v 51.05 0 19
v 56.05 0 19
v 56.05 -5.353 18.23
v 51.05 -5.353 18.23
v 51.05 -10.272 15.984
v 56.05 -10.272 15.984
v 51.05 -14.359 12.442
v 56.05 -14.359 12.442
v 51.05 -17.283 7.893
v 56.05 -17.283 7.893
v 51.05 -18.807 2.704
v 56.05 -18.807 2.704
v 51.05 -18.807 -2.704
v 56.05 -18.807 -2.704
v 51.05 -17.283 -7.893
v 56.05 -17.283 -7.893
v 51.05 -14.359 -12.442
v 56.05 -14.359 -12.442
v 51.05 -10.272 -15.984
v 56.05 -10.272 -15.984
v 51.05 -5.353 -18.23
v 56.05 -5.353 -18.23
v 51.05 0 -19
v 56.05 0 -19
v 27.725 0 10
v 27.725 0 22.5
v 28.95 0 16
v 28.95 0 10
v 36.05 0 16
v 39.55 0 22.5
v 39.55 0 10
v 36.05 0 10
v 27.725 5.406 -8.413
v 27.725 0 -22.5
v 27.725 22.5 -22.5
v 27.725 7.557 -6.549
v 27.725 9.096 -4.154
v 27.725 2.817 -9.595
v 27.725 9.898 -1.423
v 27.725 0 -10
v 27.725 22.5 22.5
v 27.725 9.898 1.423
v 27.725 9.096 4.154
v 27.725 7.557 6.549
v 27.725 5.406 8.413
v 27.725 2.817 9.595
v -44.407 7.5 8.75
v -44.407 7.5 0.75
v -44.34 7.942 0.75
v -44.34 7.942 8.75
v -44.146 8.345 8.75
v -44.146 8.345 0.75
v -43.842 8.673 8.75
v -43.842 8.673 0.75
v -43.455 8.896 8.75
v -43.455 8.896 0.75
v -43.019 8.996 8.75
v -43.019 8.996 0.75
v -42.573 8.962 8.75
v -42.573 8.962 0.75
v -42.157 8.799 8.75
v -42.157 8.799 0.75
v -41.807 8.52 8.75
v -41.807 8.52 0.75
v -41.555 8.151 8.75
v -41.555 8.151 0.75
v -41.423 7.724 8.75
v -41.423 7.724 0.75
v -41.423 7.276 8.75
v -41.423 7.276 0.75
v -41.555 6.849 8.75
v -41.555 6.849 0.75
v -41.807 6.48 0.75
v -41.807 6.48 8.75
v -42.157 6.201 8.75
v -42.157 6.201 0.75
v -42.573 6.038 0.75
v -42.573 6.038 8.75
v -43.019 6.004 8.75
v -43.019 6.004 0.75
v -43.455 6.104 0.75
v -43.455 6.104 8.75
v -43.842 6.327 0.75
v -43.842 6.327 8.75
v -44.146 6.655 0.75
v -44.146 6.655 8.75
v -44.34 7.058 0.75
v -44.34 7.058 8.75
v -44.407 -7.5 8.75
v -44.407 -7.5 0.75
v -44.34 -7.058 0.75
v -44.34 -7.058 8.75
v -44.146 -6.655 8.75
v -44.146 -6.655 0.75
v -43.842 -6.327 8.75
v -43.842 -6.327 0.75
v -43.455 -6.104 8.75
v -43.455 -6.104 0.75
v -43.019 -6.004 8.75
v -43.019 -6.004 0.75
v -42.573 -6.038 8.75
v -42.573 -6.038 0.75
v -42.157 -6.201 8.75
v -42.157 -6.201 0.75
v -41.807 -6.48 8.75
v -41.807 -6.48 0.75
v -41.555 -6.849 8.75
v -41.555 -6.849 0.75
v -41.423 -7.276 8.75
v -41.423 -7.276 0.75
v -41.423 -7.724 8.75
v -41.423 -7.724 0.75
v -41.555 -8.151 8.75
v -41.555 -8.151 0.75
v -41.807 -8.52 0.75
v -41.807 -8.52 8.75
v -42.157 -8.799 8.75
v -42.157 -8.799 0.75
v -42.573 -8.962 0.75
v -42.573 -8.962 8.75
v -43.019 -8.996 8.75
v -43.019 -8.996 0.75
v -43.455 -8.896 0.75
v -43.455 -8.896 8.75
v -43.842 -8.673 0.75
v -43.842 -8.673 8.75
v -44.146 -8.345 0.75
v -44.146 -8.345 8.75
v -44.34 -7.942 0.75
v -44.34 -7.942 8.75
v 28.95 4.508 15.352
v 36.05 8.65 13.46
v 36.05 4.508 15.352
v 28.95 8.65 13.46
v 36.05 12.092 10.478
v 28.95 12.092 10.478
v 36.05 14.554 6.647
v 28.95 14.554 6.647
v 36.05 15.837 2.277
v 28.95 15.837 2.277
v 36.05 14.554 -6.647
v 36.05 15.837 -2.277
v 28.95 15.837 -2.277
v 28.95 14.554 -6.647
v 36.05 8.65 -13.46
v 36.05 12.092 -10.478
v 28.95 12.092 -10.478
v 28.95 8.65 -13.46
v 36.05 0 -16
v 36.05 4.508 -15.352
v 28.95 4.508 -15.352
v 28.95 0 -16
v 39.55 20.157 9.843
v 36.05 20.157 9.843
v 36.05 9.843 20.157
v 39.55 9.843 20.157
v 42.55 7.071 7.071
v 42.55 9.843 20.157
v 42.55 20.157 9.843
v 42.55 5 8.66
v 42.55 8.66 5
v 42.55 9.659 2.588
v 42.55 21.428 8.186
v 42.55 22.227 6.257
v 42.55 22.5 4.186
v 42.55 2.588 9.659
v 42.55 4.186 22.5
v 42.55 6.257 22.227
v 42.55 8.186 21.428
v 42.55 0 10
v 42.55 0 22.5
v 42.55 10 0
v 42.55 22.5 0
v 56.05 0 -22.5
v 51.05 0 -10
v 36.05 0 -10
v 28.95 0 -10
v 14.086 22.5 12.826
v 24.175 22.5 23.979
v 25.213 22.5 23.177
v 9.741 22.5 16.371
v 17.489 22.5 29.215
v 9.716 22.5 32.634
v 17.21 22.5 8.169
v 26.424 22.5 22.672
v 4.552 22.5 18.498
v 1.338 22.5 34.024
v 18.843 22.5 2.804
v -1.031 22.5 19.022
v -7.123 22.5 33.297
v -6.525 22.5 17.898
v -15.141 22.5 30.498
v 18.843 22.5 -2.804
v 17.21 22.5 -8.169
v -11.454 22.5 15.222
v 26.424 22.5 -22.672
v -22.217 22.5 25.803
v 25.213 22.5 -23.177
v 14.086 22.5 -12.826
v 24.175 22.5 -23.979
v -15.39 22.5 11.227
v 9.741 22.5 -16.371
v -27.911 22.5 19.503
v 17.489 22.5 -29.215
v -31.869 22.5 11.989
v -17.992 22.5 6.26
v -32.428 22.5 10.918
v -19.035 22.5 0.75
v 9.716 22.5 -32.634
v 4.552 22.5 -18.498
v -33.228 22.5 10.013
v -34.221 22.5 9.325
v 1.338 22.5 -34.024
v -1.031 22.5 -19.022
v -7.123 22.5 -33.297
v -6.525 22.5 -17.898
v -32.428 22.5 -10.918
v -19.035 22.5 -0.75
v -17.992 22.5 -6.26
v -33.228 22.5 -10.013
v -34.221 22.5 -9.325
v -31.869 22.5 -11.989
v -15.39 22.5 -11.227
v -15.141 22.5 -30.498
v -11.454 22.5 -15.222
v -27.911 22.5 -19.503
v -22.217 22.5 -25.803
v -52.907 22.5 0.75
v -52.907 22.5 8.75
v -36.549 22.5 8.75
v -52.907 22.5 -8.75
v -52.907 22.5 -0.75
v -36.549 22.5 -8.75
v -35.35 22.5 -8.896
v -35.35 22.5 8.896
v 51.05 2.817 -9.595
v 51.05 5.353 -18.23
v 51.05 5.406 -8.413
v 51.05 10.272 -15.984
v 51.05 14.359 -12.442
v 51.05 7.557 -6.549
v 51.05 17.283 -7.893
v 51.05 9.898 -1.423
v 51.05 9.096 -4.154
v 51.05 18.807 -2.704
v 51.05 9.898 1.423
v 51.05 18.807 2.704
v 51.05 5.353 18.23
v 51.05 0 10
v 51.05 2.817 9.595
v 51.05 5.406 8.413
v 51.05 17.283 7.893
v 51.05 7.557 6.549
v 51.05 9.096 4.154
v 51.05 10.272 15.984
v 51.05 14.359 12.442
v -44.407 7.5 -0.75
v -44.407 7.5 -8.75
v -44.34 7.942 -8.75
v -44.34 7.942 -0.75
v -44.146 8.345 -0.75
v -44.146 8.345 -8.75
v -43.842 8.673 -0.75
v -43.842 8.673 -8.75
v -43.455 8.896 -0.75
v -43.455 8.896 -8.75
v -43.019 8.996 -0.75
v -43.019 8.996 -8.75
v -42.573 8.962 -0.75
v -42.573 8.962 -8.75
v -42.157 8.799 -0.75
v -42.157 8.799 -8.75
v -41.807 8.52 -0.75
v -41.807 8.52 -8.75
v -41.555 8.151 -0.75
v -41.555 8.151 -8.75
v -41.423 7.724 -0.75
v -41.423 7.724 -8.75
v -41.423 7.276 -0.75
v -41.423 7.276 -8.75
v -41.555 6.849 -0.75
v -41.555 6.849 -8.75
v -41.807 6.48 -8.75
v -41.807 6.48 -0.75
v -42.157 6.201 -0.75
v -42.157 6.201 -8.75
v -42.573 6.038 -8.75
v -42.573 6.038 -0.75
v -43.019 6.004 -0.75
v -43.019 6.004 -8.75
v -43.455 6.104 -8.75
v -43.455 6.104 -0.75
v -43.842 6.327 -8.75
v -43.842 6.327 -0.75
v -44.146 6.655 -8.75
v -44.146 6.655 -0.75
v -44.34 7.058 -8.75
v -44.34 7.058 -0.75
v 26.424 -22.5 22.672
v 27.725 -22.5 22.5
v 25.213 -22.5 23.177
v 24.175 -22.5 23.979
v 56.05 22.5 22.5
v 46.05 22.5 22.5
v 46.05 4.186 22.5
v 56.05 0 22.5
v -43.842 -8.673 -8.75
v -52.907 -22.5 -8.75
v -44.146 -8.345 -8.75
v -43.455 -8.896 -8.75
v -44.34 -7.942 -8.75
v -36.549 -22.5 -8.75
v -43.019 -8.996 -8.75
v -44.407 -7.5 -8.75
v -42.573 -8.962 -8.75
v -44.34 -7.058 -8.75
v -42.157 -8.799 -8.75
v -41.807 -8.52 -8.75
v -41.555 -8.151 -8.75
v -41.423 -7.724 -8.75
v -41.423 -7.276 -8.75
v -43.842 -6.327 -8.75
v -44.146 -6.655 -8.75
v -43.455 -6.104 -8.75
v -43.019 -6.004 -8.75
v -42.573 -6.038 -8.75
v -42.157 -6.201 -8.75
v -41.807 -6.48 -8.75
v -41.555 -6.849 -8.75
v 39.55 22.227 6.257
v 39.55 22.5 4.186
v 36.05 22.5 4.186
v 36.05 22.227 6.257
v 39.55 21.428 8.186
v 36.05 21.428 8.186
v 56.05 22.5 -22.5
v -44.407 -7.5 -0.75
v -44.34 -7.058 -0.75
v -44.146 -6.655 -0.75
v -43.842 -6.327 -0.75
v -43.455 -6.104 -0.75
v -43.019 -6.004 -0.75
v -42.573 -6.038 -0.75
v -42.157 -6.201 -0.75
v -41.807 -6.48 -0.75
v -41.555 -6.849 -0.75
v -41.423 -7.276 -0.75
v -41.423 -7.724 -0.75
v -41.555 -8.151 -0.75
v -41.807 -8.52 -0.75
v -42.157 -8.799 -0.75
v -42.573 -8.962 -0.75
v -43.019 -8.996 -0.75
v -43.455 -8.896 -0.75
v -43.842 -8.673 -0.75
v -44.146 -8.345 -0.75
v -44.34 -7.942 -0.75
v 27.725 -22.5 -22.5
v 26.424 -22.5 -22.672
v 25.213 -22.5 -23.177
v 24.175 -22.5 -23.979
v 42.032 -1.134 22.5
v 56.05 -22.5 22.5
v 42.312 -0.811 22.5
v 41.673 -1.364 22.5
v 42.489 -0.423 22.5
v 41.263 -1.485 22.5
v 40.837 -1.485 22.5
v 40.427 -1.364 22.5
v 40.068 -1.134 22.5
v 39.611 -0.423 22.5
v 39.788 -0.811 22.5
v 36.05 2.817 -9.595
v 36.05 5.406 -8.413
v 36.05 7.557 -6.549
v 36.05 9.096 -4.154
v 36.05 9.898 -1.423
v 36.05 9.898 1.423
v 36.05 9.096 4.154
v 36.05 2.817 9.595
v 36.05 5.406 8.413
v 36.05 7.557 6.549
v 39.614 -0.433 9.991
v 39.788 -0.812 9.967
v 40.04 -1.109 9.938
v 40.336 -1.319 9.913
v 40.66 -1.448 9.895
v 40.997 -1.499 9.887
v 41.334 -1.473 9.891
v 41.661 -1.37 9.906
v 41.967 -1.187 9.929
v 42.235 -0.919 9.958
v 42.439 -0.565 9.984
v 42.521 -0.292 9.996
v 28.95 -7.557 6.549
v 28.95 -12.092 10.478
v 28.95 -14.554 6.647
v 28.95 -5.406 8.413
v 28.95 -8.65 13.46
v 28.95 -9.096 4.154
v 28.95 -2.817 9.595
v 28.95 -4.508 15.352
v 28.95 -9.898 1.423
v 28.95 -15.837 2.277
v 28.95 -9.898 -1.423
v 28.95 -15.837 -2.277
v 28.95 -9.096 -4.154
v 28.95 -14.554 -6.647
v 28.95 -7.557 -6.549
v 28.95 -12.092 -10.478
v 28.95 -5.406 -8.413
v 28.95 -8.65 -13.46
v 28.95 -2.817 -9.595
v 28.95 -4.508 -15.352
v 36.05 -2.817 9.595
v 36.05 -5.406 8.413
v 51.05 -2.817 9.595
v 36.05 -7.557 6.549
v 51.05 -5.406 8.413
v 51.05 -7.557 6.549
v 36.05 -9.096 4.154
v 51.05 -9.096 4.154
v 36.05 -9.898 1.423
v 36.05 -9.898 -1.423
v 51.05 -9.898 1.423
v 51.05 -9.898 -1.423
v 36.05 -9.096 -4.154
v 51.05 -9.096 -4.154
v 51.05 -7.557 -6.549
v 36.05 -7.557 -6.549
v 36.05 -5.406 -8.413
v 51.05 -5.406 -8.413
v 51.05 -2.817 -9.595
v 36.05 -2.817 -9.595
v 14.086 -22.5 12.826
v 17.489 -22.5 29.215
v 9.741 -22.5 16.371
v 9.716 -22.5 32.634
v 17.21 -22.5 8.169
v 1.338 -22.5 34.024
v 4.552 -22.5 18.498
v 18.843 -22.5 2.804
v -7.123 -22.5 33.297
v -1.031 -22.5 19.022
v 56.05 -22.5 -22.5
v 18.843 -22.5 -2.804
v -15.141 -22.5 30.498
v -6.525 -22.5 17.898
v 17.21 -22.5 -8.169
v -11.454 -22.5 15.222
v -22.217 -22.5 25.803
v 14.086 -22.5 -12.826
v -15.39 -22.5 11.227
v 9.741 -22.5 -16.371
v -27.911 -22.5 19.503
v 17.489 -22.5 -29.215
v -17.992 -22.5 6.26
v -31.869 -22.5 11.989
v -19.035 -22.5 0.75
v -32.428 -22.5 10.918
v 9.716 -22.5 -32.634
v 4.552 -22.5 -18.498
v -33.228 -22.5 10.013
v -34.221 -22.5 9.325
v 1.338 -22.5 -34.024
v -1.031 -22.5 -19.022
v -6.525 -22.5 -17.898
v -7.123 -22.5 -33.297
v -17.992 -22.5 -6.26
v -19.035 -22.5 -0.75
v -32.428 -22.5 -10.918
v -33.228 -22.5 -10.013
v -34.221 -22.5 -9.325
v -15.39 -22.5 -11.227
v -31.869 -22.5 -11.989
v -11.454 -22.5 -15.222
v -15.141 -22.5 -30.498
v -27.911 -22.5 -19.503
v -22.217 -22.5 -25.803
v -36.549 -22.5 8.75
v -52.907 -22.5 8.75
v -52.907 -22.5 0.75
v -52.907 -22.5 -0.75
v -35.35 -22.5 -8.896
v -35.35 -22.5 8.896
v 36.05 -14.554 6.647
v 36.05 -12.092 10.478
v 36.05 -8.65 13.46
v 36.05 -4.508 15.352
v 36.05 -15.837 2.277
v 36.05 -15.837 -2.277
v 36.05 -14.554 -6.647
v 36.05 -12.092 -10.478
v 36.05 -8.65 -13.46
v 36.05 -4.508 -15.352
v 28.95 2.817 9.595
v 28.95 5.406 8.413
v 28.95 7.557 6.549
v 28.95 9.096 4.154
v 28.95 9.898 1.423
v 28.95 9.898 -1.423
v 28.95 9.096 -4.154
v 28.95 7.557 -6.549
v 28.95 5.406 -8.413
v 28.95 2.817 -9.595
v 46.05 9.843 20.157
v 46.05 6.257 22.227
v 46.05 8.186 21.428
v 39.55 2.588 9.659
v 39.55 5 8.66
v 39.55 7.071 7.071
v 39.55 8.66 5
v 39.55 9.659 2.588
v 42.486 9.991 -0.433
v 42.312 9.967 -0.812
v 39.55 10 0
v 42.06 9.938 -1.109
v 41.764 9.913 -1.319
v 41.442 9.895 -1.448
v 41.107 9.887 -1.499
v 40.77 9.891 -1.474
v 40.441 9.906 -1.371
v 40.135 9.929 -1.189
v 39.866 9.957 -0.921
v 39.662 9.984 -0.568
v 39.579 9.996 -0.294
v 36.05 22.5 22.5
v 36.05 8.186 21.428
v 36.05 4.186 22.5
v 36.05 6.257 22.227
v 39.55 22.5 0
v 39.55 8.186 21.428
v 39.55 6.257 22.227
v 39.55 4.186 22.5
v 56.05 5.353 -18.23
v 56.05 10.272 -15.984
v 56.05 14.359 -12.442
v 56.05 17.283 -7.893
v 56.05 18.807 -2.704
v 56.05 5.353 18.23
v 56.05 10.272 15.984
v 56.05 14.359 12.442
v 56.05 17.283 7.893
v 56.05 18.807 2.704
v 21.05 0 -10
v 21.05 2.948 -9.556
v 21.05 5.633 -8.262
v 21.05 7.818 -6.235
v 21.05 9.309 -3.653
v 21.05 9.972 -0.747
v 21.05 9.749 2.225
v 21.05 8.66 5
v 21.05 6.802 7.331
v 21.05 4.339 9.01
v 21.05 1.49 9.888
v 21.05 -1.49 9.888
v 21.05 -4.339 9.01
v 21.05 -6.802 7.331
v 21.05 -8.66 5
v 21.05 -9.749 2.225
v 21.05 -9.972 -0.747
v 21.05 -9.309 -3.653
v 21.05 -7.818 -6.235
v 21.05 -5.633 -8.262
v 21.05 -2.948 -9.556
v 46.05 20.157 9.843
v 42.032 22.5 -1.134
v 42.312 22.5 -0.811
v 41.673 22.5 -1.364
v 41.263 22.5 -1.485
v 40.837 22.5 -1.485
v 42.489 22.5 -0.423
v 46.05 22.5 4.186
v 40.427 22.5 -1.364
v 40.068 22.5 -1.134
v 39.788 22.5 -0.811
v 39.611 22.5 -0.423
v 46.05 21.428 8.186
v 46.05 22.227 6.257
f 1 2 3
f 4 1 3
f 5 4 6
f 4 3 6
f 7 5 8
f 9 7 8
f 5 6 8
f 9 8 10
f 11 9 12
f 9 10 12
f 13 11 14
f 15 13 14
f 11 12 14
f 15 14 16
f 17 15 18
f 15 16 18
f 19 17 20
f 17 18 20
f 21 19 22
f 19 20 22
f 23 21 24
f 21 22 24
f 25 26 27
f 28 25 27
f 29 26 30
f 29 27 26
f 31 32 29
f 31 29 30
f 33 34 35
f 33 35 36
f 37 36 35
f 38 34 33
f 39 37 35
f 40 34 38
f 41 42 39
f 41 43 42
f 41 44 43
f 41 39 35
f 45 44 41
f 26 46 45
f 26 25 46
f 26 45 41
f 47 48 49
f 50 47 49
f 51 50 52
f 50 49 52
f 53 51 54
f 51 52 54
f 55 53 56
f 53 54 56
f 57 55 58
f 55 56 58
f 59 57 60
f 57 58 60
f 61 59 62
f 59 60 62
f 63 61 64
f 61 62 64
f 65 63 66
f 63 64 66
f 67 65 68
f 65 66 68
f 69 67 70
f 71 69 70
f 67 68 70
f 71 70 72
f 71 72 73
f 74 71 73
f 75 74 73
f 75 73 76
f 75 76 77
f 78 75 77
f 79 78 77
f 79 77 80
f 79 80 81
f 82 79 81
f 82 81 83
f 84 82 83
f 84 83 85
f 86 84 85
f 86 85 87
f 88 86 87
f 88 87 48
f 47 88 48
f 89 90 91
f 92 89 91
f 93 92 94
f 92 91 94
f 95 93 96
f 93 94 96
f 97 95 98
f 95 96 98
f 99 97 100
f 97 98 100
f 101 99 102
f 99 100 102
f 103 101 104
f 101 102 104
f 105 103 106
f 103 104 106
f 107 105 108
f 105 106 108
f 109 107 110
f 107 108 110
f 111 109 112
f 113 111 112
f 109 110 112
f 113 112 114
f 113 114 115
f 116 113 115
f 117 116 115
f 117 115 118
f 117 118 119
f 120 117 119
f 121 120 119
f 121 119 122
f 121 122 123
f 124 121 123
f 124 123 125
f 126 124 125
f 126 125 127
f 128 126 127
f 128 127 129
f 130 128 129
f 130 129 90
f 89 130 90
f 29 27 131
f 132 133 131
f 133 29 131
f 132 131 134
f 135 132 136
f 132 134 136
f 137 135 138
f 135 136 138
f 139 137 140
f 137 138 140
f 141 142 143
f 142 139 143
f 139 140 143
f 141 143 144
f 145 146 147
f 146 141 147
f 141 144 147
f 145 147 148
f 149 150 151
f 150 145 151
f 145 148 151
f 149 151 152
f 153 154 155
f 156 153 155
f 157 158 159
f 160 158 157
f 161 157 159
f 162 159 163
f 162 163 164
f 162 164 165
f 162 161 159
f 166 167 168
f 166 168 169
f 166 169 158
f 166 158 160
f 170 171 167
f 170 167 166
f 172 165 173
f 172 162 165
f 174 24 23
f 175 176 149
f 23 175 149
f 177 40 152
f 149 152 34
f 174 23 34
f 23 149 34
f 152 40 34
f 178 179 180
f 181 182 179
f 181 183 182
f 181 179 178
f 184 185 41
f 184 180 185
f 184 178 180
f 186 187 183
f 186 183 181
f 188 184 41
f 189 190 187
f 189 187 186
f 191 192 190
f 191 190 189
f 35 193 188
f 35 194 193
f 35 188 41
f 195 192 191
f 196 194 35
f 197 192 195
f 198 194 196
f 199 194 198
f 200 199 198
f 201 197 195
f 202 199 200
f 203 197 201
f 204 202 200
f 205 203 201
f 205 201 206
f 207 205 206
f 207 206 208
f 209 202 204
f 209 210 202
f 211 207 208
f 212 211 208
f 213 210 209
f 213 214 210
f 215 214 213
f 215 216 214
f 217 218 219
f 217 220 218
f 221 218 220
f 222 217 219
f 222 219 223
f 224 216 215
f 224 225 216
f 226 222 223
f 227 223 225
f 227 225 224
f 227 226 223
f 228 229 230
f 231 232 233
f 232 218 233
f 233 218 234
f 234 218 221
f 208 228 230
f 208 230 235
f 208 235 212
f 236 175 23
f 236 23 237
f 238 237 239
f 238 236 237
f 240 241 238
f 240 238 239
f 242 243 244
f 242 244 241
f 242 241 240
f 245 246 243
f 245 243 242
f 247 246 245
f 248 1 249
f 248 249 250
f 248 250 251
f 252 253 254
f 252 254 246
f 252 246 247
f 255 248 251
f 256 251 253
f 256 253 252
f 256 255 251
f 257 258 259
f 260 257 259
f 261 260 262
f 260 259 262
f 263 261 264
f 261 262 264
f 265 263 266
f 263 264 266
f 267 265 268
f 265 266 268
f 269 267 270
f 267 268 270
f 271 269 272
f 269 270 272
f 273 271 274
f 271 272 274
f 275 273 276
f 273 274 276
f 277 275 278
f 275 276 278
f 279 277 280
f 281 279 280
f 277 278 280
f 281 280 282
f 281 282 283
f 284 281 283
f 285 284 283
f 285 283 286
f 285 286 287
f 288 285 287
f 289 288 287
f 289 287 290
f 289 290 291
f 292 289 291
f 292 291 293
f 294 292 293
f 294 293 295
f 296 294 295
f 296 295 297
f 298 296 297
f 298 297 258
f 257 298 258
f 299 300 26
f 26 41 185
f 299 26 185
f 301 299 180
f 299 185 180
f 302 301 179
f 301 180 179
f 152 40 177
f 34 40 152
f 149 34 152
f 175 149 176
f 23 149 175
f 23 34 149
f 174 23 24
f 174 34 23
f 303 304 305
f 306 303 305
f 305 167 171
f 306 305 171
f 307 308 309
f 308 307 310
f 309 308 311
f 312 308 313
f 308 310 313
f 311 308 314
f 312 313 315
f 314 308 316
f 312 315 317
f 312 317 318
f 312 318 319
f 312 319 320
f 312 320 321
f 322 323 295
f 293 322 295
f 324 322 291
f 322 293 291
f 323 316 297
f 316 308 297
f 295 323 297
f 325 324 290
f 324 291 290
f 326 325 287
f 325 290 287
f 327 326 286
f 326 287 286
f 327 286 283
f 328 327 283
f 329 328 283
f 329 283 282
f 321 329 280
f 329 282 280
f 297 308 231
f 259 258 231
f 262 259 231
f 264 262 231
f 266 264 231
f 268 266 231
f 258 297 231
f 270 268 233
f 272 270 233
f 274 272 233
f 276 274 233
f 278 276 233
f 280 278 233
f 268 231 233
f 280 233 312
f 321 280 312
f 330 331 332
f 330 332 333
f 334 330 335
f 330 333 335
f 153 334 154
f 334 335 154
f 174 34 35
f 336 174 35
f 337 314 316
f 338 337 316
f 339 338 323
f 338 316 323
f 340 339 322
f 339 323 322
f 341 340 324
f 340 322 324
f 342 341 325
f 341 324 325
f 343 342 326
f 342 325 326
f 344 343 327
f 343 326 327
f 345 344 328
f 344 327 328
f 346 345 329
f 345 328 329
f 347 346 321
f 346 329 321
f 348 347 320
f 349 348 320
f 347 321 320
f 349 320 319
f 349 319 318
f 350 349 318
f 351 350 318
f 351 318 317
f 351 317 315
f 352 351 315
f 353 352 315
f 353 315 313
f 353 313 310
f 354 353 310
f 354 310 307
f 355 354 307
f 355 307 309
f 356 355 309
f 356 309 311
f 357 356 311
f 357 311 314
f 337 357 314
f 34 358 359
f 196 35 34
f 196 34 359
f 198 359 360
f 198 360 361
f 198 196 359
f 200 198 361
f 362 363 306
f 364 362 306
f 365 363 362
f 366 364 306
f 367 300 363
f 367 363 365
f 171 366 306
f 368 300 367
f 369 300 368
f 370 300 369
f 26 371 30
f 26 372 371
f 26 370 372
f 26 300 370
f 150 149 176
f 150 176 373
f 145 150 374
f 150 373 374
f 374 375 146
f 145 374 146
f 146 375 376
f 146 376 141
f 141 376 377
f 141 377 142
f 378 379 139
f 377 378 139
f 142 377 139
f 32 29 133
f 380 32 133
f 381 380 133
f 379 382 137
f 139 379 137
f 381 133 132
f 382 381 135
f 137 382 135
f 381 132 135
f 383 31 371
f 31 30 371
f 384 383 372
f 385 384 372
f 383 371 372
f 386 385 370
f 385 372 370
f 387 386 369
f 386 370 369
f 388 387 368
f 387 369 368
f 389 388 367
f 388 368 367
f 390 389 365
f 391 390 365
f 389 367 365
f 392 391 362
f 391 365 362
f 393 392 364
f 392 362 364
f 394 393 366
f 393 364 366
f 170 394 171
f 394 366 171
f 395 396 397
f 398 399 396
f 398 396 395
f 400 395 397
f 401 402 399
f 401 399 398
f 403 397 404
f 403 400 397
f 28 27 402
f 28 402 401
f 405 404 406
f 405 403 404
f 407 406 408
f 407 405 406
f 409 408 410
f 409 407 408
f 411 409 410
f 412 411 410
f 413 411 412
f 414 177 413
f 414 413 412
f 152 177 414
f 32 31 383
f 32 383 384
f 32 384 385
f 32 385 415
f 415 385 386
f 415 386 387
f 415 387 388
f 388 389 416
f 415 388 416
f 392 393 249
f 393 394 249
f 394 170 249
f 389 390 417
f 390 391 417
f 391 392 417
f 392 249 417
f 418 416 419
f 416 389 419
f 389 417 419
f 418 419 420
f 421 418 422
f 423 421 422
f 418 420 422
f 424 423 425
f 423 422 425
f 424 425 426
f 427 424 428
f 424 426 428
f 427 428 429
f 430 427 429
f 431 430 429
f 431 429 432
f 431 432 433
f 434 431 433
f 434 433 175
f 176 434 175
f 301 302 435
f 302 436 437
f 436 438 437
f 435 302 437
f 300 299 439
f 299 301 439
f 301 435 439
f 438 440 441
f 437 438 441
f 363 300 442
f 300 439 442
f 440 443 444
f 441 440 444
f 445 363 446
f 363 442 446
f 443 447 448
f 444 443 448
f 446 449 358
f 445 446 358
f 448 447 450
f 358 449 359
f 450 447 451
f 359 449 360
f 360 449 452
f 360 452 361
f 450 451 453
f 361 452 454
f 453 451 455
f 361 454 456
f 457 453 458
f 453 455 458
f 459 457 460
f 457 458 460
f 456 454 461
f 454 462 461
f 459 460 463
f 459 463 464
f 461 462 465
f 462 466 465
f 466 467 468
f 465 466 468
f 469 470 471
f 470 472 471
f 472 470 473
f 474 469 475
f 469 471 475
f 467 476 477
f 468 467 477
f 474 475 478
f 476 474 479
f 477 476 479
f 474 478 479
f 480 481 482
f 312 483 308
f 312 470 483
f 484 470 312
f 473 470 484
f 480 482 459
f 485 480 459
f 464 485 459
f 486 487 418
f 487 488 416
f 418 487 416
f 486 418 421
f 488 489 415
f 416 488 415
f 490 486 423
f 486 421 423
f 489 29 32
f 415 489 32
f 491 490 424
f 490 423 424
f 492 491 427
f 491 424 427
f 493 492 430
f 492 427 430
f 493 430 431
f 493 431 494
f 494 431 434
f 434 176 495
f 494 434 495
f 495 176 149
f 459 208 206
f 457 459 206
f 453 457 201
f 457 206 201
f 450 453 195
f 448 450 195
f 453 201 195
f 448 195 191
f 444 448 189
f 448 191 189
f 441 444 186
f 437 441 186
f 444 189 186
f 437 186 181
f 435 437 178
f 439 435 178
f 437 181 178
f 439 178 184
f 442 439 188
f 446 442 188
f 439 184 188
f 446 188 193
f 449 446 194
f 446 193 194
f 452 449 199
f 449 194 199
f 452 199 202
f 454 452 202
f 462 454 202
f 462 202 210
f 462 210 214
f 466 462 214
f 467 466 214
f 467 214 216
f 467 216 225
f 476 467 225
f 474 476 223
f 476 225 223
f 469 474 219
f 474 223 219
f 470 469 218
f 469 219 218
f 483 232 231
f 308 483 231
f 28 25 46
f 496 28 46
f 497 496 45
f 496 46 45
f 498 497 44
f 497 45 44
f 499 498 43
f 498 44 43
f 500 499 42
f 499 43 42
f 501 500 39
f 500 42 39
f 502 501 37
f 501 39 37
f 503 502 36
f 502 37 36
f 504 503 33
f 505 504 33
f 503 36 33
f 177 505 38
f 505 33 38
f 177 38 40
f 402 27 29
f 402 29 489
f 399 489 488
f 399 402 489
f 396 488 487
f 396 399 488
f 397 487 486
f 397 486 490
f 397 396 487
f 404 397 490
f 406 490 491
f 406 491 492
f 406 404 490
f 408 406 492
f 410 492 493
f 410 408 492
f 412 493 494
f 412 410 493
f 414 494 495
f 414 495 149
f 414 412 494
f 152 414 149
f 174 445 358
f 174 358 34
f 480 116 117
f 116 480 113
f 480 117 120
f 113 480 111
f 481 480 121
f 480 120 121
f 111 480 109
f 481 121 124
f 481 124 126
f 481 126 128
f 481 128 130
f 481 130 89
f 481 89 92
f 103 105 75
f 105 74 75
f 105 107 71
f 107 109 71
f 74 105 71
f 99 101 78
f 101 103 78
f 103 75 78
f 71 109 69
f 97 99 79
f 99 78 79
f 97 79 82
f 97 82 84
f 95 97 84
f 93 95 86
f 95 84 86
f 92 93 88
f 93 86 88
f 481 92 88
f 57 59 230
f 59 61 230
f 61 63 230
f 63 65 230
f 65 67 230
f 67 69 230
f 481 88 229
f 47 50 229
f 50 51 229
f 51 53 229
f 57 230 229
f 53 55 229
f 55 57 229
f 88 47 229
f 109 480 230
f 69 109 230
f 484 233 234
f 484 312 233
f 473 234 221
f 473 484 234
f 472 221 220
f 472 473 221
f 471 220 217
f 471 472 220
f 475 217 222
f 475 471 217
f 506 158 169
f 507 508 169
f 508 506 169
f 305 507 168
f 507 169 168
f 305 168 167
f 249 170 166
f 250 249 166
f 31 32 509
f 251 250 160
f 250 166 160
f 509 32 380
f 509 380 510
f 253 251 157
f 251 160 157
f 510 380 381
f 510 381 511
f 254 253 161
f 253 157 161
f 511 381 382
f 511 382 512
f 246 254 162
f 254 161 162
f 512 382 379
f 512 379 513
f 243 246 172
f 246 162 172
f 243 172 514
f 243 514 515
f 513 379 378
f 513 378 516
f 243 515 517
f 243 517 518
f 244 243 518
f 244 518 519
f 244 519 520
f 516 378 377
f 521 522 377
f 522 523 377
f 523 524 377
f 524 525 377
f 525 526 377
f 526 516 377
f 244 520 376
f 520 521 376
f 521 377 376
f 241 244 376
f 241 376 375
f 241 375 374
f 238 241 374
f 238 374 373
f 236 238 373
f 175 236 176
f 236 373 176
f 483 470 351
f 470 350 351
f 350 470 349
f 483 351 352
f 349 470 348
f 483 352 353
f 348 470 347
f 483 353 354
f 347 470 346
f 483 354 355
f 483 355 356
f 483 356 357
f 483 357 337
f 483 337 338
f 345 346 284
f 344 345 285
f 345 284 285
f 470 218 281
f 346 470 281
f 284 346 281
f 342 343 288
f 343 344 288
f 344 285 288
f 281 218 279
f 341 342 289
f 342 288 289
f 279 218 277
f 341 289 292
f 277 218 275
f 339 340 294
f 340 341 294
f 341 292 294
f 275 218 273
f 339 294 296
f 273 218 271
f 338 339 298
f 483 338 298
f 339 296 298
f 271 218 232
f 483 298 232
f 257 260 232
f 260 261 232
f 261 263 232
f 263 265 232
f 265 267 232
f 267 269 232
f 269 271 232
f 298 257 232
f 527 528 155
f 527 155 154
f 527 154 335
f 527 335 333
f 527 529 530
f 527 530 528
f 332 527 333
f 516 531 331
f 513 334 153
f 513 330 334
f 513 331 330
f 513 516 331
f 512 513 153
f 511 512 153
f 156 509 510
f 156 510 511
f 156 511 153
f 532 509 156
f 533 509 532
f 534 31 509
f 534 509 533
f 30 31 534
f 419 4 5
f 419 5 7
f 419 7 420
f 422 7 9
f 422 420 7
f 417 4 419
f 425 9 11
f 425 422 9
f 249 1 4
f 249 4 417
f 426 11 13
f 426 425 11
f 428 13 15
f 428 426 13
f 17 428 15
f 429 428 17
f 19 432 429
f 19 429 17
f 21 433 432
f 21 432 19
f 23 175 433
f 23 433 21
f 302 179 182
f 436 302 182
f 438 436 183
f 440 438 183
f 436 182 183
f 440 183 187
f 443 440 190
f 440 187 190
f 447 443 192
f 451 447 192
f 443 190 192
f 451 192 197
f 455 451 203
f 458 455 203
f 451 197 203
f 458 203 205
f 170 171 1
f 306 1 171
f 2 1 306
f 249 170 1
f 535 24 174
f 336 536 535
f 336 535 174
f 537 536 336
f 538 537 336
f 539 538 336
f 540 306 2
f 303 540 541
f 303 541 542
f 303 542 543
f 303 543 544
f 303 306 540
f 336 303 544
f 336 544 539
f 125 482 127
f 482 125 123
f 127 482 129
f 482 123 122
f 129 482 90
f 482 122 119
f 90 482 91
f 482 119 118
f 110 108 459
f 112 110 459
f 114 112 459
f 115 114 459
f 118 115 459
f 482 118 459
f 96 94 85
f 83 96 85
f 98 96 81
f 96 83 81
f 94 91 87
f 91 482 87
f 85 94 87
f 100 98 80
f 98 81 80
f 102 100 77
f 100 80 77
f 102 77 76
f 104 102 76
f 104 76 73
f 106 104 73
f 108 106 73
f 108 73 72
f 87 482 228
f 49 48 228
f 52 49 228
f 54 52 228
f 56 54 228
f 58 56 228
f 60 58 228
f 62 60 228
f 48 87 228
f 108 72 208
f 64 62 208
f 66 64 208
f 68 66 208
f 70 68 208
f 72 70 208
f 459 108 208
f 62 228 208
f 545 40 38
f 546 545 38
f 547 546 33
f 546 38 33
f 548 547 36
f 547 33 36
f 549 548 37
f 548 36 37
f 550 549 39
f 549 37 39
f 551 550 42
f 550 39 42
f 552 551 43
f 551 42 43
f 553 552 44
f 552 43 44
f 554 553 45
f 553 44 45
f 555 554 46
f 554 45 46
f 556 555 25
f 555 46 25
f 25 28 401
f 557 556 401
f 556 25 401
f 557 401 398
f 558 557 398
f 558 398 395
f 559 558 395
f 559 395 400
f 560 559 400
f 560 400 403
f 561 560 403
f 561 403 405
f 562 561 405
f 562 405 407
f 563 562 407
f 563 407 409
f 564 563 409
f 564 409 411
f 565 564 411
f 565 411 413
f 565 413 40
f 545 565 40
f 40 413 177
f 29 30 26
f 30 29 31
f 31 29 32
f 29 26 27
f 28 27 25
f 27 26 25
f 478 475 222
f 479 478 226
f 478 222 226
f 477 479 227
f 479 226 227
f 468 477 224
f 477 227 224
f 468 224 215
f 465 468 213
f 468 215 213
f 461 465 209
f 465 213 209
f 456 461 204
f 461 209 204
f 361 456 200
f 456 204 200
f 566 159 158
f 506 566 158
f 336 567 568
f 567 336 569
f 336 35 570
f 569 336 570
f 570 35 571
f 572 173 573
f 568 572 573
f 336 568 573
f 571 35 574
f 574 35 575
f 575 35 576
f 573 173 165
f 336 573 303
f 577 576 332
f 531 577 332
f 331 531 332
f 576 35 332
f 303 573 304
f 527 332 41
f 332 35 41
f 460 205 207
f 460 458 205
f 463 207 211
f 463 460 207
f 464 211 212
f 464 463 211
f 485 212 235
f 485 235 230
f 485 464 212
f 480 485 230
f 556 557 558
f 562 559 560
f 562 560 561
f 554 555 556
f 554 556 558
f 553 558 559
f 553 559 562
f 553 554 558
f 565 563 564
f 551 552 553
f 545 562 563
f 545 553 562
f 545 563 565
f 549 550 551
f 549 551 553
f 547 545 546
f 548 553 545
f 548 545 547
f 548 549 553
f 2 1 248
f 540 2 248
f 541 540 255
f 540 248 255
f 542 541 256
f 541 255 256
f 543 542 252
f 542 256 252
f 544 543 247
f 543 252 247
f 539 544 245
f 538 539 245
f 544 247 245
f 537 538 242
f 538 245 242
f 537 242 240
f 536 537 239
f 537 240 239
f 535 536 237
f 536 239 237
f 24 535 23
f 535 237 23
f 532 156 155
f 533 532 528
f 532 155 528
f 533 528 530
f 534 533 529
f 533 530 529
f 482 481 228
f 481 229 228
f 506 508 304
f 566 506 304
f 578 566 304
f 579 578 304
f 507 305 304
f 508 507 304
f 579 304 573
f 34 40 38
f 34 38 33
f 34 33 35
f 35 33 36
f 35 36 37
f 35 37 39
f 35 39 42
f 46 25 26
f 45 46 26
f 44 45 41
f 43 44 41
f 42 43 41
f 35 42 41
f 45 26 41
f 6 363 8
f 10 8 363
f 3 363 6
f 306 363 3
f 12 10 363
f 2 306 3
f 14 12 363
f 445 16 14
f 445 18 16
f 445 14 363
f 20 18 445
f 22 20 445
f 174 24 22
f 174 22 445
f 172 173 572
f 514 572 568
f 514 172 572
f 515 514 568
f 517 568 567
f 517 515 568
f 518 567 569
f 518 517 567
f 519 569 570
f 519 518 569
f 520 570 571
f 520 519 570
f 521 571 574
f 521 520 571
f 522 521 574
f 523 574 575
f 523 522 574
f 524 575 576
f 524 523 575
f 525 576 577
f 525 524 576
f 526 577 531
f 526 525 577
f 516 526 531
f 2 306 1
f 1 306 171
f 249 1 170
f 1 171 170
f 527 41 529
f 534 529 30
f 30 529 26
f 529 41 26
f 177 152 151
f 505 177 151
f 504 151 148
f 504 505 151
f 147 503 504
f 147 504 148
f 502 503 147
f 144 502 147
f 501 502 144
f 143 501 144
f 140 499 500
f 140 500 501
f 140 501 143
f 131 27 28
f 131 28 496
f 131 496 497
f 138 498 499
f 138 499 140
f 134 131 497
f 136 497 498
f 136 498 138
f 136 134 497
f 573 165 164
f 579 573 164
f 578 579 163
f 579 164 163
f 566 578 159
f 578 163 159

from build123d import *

# Parameters (mm, degrees)
BOSS_EXTRUDE1_DEPTH     = 22.5
F_3_0MM_DOWEL_HOLE1_D   = 3
BOSS_EXTRUDE2_START     = -8.493151603
BOSS_EXTRUDE2_OUTLINE_W = 45
BOSS_EXTRUDE2_OUTLINE_H = 45
BOSS_EXTRUDE2_DEPTH     = 30.493151603
SKETCH5_R               = 10
CUT_EXTRUDE1_DEPTH      = 35
SKETCH16_R              = 19
CUT_EXTRUDE9_DEPTH      = 5
CUT_EXTRUDE2_START      = 22.5
SKETCH7_W               = 7.1
SKETCH7_H               = 45
CUT_EXTRUDE2_DEPTH      = 40
SKETCH8_W               = 22.5
SKETCH8_H               = 22.5
CUT_EXTRUDE3_DEPTH      = 1.5
CUT_EXTRUDE5_OUTLINE_W  = 1.5
CUT_EXTRUDE5_OUTLINE_H  = 12.613186919
CUT_EXTRUDE8_START      = 9
CUT_EXTRUDE8_DEPTH      = 14
CHAMFER1_START          = 36.05
CHAMFER1_DEPTH          = 10
FILLET3_R               = 5
FILLET4_R               = 8
SKETCH23_W              = 45
SKETCH23_H              = 40
SKETCH23_R              = 16
BOSS_EXTRUDE5_DEPTH     = 7.1
SPLIT1_START            = 27.724582954
SPLIT1_DEPTH            = 23.325417046
SPLIT1_START_2          = 36.05
SPLIT1_2_DEPTH          = 15
SPLIT1_START_3          = 46.05
SPLIT1_3_DEPTH          = 10
SPLIT1_4_DEPTH          = 8.325417046
SPLIT1_5_DEPTH          = 1.225417046
SPLIT1_6_DEPTH          = 22.5
SPLIT1_7_DEPTH          = 22.5


with BuildPart() as part:
    # Sketch3 → Boss-Extrude1 (new, symmetric)
    with BuildSketch(Plane(origin=(0, 0, 0), x_dir=(1, 0, 0), z_dir=(0, 1, 0))):
        with BuildLine():
            Line((-52.906534306, 0.75), (-52.906534306, 8.75))
            Line((-52.906534306, 8.75), (-32.906534306, 8.75))
            ThreePointArc((-32.906534306, 8.75), (34.05, 0), (-32.906534306, -8.75))
            Line((-32.906534306, -8.75), (-52.906534306, -8.75))
            Line((-52.906534306, -8.75), (-52.906534306, -0.75))
            Line((-52.906534306, -0.75), (-19.035230495, -0.75))
            ThreePointArc((-19.035230495, -0.75), (19.05, 0), (-19.035230495, 0.75))
            Line((-19.035230495, 0.75), (-52.906534306, 0.75))
        make_face()
    extrude(amount=BOSS_EXTRUDE1_DEPTH, both=True)

    # Ø3.0mm Dowel Hole1 (through all)
    with Locations(Plane.XY.offset(8.75)):
        with Locations((-42.906534306, 7.5), (-42.906534306, -7.5)):
            Hole(F_3_0MM_DOWEL_HOLE1_D / 2)

    # Boss-Extrude2: read off the stored shape, not the designer's step
    # Boss-Extrude2 outline → Boss-Extrude2 (add)
    with BuildSketch(Plane(origin=(34.05, 0, 0), x_dir=(0, 0, -1), z_dir=(1, 0, 0)).offset(BOSS_EXTRUDE2_START)):
        Rectangle(BOSS_EXTRUDE2_OUTLINE_W, BOSS_EXTRUDE2_OUTLINE_H)
    extrude(amount=BOSS_EXTRUDE2_DEPTH)

    # Sketch5 → Cut-Extrude1 (cut)
    with BuildSketch(Plane(origin=(56.05, 0, 0), x_dir=(0, 0, -1), z_dir=(1, 0, 0))):
        Circle(SKETCH5_R)
    extrude(amount=-CUT_EXTRUDE1_DEPTH, mode=Mode.SUBTRACT)

    # Sketch16 → Cut-Extrude9 (cut)
    with BuildSketch(Plane(origin=(56.05, 0, 0), x_dir=(0, 0, -1), z_dir=(1, 0, 0))):
        Circle(SKETCH16_R)
    extrude(amount=-CUT_EXTRUDE9_DEPTH, mode=Mode.SUBTRACT)

    # Sketch7 → Cut-Extrude2 (cut)
    with BuildSketch(Plane(origin=(0, 0, 0), x_dir=(1, 0, 0), z_dir=(0, 1, 0)).offset(CUT_EXTRUDE2_START)):
        with Locations((32.5, 0)):
            Rectangle(SKETCH7_W, SKETCH7_H)
    extrude(amount=-CUT_EXTRUDE2_DEPTH, mode=Mode.SUBTRACT)

    # Sketch8 → Cut-Extrude3 (cut, symmetric)
    with BuildSketch(Plane.ZY.offset(-41.05)):
        with Locations((11.25, 11.25)):
            Rectangle(SKETCH8_W, SKETCH8_H)
    extrude(amount=CUT_EXTRUDE3_DEPTH, both=True, mode=Mode.SUBTRACT)

    # Cut-Extrude5: read off the stored shape, not the designer's step
    # Cut-Extrude5 outline → Cut-Extrude5 (revolve, cut)
    with BuildSketch(Plane(origin=(41.05, 0, 0), x_dir=(1, 0, 0), z_dir=(0, -1, 0))):
        with Locations((0.75, 16.19340654)):
            Rectangle(CUT_EXTRUDE5_OUTLINE_W, CUT_EXTRUDE5_OUTLINE_H)
    revolve(axis=Axis((41.05, 0, 0), (0, 0, 1)), mode=Mode.SUBTRACT)

    # Cut-Extrude8: read off the stored shape, not the designer's step
    # Cut-Extrude8 outline → Cut-Extrude8 (cut)
    with BuildSketch(Plane(origin=(0, 0, 0), x_dir=(1, 0, 0), z_dir=(0, 1, 0)).offset(CUT_EXTRUDE8_START)):
        with BuildLine():
            ThreePointArc((42.55, 0), (41.05, 1.5), (39.55, 0))
            Line((39.55, 0), (42.55, 0))
        make_face()
    extrude(amount=CUT_EXTRUDE8_DEPTH, mode=Mode.SUBTRACT)

    # Chamfer1: read off the stored shape, not the designer's step
    # Chamfer1 outline → Chamfer1 (cut)
    with BuildSketch(Plane.YZ.offset(CHAMFER1_START)):
        Polygon((22.5, 22.5), (7.5, 22.5), (22.5, 7.5), align=None)
    extrude(amount=CHAMFER1_DEPTH, mode=Mode.SUBTRACT)

    # Fillet3
    fillet3_edges = [part.edges().sort_by_distance(p)[0] for p in [
        (-32.906534306, 0, -8.75),
        (-32.906534306, 0, 8.75),
        (25.556848397, 0, -22.5),
        (25.556848397, 0, 22.5),
    ]]
    fillet(fillet3_edges, radius=FILLET3_R)

    # Fillet4
    fillet4_edges = [part.edges().sort_by_distance(p)[0] for p in [
        (37.8, 22.5, 7.5),
        (44.3, 22.5, 7.5),
        (37.8, 7.5, 22.5),
        (44.3, 7.5, 22.5),
    ]]
    fillet(fillet4_edges, radius=FILLET4_R)

    # Sketch23 → Boss-Extrude5 (add)
    with BuildSketch(Plane(origin=(28.95, 0, 0), x_dir=(0, 0, -1), z_dir=(1, 0, 0))):
        with Locations((0, 2.5)):
            Rectangle(SKETCH23_W, SKETCH23_H)
        with Locations(Location((0, 0, 0), (0, 0, 180))):
            Circle(SKETCH23_R, mode=Mode.SUBTRACT)
    extrude(amount=BOSS_EXTRUDE5_DEPTH)

    # Split1 7 outline → Split1 7 (cut)
    with BuildSketch(Plane(origin=(0, 0, 0), x_dir=(1, 0, 0), z_dir=(0, 1, 0))):
        with BuildLine():
            Line((27.724582954, 22.5), (27.724582954, -22.5))
            Line((27.724582954, -22.5), (39.55, -22.5))
            Line((39.55, -22.5), (39.55, 0))
            ThreePointArc((39.55, 0), (41.05, 1.5), (42.55, 0))
            Line((42.55, 0), (42.55, -22.5))
            Line((42.55, -22.5), (56.05, -22.5))
            Line((56.05, -22.5), (56.05, 22.5))
            Line((56.05, 22.5), (27.724582954, 22.5))
        make_face()
    extrude(amount=SPLIT1_7_DEPTH, mode=Mode.SUBTRACT)


with BuildPart() as body_2:
    # Split1: read off the stored shape, not the designer's step
    # Split1 outline → Split1 (new body)
    with BuildSketch(Plane.YZ.offset(SPLIT1_START)):
        with BuildLine():
            Line((4.186291501, 22.5), (0, 22.5))
            Line((0, 22.5), (0, 16))
            ThreePointArc((0, 16), (16, 0), (0, -16))
            Line((0, -16), (0, -22.5))
            Line((0, -22.5), (22.5, -22.5))
            Line((22.5, -22.5), (22.5, 4.186291501))
            ThreePointArc((22.5, 4.186291501), (21.89103626, 7.24775896), (20.156854249, 9.843145751))
            Line((20.156854249, 9.843145751), (9.843145751, 20.156854249))
            ThreePointArc((9.843145751, 20.156854249), (7.24775896, 21.89103626), (4.186291501, 22.5))
        make_face()
    extrude(amount=SPLIT1_DEPTH)

    # Split1 2 outline → Split1 2 (add)
    with BuildSketch(Plane.YZ.offset(SPLIT1_START_2)):
        with BuildLine():
            ThreePointArc((0, -16), (16, 0), (0, 16))
            Line((0, 16), (0, 10))
            ThreePointArc((0, 10), (10, 0), (0, -10))
            Line((0, -10), (0, -16))
        make_face()
    extrude(amount=SPLIT1_2_DEPTH)

    # Split1 3 outline → Split1 3 (add)
    with BuildSketch(Plane.YZ.offset(SPLIT1_START_3)):
        with BuildLine():
            Line((0, 22.5), (0, 19))
            ThreePointArc((0, 19), (19, 0), (0, -19))
            Line((0, -19), (0, -22.5))
            Line((0, -22.5), (22.5, -22.5))
            Line((22.5, -22.5), (22.5, 22.5))
            Line((22.5, 22.5), (0, 22.5))
        make_face()
    extrude(amount=SPLIT1_3_DEPTH)

    # Split1 4 outline → Split1 4 (add)
    with BuildSketch(Plane.YZ.offset(SPLIT1_START)):
        with BuildLine():
            Line((22.5, 22.5), (4.186291501, 22.5))
            ThreePointArc((4.186291501, 22.5), (7.24775896, 21.89103626), (9.843145751, 20.156854249))
            Line((9.843145751, 20.156854249), (20.156854249, 9.843145751))
            ThreePointArc((20.156854249, 9.843145751), (21.89103626, 7.24775896), (22.5, 4.186291501))
            Line((22.5, 4.186291501), (22.5, 22.5))
        make_face()
    extrude(amount=SPLIT1_4_DEPTH)

    # Split1 5 outline → Split1 5 (add)
    with BuildSketch(Plane.YZ.offset(SPLIT1_START)):
        with BuildLine():
            ThreePointArc((0, -16), (16, 0), (0, 16))
            Line((0, 16), (0, 10))
            ThreePointArc((0, 10), (10, 0), (0, -10))
            Line((0, -10), (0, -16))
        make_face()
    extrude(amount=SPLIT1_5_DEPTH)

    # Split1 6 outline → Split1 6 (cut)
    with BuildSketch(Plane(origin=(0, 0, 0), x_dir=(1, 0, 0), z_dir=(0, 1, 0))):
        with BuildLine():
            Line((39.55, 0), (39.55, -22.5))
            Line((39.55, -22.5), (42.55, -22.5))
            Line((42.55, -22.5), (42.55, 0))
            ThreePointArc((42.55, 0), (41.05, 1.5), (39.55, 0))
        make_face()
    extrude(amount=SPLIT1_6_DEPTH, mode=Mode.SUBTRACT)


solid = Compound([part.part, body_2.part])
